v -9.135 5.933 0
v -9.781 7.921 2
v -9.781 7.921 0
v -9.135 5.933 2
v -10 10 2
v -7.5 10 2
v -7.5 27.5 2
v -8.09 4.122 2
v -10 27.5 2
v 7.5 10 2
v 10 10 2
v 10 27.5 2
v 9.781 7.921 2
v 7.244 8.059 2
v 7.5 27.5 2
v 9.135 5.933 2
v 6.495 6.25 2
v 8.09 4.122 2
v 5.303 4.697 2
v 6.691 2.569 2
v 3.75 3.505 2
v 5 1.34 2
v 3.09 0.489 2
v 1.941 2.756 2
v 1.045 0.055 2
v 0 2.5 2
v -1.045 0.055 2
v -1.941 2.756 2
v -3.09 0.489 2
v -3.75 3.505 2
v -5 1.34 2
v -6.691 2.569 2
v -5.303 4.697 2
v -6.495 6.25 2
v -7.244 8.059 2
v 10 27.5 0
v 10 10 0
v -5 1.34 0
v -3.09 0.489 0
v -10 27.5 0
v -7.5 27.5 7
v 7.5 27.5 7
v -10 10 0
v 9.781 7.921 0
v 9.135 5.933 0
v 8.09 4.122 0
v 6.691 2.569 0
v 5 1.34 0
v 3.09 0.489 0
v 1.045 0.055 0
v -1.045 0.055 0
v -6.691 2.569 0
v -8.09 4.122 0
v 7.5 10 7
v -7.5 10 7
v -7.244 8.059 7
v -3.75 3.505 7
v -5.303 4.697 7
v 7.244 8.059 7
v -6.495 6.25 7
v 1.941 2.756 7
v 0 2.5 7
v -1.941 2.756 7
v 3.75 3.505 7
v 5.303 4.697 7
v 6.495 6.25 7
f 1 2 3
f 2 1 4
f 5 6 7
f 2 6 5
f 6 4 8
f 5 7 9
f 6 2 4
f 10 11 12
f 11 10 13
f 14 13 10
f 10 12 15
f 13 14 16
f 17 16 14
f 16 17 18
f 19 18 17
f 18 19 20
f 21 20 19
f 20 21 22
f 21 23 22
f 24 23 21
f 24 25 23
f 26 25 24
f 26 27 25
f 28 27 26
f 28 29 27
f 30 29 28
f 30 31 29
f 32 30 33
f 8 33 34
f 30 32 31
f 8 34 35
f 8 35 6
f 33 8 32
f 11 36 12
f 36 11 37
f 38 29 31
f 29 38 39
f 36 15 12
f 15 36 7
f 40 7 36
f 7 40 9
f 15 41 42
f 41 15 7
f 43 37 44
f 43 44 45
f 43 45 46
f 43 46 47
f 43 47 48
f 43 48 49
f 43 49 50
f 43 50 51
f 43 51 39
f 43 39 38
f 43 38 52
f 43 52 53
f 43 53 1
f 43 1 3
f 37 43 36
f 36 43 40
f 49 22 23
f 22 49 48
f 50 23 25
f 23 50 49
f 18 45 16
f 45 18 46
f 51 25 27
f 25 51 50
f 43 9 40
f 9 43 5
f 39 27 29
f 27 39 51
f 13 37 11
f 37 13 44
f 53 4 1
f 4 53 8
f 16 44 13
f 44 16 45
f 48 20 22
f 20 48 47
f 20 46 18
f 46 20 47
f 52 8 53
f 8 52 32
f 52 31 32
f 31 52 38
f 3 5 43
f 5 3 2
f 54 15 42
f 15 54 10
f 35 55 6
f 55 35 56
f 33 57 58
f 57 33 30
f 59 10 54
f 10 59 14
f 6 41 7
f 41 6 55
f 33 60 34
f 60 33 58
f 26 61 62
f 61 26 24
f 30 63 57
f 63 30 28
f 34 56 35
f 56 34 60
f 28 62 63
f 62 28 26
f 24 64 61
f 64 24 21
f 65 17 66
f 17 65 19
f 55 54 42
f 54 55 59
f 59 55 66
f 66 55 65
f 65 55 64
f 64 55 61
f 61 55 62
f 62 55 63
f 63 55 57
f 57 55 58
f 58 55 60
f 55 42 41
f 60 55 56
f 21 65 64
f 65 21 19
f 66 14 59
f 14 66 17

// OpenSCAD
module bracket() {
	hull() {
		translate([0, 10, 1]) cylinder(h=2, r=10, center=true);
		translate([0, 20, 1]) cube([20,15,2], center=true);
		}
	hull() {
		translate([0, 10, 4]) cylinder(h=6, r=7.5, center=true);
		translate([0, 20, 4]) cube([15,15,6], center=true);
		}
	}

module screw() {
	
}

difference() {
	bracket();
	screw();
}
